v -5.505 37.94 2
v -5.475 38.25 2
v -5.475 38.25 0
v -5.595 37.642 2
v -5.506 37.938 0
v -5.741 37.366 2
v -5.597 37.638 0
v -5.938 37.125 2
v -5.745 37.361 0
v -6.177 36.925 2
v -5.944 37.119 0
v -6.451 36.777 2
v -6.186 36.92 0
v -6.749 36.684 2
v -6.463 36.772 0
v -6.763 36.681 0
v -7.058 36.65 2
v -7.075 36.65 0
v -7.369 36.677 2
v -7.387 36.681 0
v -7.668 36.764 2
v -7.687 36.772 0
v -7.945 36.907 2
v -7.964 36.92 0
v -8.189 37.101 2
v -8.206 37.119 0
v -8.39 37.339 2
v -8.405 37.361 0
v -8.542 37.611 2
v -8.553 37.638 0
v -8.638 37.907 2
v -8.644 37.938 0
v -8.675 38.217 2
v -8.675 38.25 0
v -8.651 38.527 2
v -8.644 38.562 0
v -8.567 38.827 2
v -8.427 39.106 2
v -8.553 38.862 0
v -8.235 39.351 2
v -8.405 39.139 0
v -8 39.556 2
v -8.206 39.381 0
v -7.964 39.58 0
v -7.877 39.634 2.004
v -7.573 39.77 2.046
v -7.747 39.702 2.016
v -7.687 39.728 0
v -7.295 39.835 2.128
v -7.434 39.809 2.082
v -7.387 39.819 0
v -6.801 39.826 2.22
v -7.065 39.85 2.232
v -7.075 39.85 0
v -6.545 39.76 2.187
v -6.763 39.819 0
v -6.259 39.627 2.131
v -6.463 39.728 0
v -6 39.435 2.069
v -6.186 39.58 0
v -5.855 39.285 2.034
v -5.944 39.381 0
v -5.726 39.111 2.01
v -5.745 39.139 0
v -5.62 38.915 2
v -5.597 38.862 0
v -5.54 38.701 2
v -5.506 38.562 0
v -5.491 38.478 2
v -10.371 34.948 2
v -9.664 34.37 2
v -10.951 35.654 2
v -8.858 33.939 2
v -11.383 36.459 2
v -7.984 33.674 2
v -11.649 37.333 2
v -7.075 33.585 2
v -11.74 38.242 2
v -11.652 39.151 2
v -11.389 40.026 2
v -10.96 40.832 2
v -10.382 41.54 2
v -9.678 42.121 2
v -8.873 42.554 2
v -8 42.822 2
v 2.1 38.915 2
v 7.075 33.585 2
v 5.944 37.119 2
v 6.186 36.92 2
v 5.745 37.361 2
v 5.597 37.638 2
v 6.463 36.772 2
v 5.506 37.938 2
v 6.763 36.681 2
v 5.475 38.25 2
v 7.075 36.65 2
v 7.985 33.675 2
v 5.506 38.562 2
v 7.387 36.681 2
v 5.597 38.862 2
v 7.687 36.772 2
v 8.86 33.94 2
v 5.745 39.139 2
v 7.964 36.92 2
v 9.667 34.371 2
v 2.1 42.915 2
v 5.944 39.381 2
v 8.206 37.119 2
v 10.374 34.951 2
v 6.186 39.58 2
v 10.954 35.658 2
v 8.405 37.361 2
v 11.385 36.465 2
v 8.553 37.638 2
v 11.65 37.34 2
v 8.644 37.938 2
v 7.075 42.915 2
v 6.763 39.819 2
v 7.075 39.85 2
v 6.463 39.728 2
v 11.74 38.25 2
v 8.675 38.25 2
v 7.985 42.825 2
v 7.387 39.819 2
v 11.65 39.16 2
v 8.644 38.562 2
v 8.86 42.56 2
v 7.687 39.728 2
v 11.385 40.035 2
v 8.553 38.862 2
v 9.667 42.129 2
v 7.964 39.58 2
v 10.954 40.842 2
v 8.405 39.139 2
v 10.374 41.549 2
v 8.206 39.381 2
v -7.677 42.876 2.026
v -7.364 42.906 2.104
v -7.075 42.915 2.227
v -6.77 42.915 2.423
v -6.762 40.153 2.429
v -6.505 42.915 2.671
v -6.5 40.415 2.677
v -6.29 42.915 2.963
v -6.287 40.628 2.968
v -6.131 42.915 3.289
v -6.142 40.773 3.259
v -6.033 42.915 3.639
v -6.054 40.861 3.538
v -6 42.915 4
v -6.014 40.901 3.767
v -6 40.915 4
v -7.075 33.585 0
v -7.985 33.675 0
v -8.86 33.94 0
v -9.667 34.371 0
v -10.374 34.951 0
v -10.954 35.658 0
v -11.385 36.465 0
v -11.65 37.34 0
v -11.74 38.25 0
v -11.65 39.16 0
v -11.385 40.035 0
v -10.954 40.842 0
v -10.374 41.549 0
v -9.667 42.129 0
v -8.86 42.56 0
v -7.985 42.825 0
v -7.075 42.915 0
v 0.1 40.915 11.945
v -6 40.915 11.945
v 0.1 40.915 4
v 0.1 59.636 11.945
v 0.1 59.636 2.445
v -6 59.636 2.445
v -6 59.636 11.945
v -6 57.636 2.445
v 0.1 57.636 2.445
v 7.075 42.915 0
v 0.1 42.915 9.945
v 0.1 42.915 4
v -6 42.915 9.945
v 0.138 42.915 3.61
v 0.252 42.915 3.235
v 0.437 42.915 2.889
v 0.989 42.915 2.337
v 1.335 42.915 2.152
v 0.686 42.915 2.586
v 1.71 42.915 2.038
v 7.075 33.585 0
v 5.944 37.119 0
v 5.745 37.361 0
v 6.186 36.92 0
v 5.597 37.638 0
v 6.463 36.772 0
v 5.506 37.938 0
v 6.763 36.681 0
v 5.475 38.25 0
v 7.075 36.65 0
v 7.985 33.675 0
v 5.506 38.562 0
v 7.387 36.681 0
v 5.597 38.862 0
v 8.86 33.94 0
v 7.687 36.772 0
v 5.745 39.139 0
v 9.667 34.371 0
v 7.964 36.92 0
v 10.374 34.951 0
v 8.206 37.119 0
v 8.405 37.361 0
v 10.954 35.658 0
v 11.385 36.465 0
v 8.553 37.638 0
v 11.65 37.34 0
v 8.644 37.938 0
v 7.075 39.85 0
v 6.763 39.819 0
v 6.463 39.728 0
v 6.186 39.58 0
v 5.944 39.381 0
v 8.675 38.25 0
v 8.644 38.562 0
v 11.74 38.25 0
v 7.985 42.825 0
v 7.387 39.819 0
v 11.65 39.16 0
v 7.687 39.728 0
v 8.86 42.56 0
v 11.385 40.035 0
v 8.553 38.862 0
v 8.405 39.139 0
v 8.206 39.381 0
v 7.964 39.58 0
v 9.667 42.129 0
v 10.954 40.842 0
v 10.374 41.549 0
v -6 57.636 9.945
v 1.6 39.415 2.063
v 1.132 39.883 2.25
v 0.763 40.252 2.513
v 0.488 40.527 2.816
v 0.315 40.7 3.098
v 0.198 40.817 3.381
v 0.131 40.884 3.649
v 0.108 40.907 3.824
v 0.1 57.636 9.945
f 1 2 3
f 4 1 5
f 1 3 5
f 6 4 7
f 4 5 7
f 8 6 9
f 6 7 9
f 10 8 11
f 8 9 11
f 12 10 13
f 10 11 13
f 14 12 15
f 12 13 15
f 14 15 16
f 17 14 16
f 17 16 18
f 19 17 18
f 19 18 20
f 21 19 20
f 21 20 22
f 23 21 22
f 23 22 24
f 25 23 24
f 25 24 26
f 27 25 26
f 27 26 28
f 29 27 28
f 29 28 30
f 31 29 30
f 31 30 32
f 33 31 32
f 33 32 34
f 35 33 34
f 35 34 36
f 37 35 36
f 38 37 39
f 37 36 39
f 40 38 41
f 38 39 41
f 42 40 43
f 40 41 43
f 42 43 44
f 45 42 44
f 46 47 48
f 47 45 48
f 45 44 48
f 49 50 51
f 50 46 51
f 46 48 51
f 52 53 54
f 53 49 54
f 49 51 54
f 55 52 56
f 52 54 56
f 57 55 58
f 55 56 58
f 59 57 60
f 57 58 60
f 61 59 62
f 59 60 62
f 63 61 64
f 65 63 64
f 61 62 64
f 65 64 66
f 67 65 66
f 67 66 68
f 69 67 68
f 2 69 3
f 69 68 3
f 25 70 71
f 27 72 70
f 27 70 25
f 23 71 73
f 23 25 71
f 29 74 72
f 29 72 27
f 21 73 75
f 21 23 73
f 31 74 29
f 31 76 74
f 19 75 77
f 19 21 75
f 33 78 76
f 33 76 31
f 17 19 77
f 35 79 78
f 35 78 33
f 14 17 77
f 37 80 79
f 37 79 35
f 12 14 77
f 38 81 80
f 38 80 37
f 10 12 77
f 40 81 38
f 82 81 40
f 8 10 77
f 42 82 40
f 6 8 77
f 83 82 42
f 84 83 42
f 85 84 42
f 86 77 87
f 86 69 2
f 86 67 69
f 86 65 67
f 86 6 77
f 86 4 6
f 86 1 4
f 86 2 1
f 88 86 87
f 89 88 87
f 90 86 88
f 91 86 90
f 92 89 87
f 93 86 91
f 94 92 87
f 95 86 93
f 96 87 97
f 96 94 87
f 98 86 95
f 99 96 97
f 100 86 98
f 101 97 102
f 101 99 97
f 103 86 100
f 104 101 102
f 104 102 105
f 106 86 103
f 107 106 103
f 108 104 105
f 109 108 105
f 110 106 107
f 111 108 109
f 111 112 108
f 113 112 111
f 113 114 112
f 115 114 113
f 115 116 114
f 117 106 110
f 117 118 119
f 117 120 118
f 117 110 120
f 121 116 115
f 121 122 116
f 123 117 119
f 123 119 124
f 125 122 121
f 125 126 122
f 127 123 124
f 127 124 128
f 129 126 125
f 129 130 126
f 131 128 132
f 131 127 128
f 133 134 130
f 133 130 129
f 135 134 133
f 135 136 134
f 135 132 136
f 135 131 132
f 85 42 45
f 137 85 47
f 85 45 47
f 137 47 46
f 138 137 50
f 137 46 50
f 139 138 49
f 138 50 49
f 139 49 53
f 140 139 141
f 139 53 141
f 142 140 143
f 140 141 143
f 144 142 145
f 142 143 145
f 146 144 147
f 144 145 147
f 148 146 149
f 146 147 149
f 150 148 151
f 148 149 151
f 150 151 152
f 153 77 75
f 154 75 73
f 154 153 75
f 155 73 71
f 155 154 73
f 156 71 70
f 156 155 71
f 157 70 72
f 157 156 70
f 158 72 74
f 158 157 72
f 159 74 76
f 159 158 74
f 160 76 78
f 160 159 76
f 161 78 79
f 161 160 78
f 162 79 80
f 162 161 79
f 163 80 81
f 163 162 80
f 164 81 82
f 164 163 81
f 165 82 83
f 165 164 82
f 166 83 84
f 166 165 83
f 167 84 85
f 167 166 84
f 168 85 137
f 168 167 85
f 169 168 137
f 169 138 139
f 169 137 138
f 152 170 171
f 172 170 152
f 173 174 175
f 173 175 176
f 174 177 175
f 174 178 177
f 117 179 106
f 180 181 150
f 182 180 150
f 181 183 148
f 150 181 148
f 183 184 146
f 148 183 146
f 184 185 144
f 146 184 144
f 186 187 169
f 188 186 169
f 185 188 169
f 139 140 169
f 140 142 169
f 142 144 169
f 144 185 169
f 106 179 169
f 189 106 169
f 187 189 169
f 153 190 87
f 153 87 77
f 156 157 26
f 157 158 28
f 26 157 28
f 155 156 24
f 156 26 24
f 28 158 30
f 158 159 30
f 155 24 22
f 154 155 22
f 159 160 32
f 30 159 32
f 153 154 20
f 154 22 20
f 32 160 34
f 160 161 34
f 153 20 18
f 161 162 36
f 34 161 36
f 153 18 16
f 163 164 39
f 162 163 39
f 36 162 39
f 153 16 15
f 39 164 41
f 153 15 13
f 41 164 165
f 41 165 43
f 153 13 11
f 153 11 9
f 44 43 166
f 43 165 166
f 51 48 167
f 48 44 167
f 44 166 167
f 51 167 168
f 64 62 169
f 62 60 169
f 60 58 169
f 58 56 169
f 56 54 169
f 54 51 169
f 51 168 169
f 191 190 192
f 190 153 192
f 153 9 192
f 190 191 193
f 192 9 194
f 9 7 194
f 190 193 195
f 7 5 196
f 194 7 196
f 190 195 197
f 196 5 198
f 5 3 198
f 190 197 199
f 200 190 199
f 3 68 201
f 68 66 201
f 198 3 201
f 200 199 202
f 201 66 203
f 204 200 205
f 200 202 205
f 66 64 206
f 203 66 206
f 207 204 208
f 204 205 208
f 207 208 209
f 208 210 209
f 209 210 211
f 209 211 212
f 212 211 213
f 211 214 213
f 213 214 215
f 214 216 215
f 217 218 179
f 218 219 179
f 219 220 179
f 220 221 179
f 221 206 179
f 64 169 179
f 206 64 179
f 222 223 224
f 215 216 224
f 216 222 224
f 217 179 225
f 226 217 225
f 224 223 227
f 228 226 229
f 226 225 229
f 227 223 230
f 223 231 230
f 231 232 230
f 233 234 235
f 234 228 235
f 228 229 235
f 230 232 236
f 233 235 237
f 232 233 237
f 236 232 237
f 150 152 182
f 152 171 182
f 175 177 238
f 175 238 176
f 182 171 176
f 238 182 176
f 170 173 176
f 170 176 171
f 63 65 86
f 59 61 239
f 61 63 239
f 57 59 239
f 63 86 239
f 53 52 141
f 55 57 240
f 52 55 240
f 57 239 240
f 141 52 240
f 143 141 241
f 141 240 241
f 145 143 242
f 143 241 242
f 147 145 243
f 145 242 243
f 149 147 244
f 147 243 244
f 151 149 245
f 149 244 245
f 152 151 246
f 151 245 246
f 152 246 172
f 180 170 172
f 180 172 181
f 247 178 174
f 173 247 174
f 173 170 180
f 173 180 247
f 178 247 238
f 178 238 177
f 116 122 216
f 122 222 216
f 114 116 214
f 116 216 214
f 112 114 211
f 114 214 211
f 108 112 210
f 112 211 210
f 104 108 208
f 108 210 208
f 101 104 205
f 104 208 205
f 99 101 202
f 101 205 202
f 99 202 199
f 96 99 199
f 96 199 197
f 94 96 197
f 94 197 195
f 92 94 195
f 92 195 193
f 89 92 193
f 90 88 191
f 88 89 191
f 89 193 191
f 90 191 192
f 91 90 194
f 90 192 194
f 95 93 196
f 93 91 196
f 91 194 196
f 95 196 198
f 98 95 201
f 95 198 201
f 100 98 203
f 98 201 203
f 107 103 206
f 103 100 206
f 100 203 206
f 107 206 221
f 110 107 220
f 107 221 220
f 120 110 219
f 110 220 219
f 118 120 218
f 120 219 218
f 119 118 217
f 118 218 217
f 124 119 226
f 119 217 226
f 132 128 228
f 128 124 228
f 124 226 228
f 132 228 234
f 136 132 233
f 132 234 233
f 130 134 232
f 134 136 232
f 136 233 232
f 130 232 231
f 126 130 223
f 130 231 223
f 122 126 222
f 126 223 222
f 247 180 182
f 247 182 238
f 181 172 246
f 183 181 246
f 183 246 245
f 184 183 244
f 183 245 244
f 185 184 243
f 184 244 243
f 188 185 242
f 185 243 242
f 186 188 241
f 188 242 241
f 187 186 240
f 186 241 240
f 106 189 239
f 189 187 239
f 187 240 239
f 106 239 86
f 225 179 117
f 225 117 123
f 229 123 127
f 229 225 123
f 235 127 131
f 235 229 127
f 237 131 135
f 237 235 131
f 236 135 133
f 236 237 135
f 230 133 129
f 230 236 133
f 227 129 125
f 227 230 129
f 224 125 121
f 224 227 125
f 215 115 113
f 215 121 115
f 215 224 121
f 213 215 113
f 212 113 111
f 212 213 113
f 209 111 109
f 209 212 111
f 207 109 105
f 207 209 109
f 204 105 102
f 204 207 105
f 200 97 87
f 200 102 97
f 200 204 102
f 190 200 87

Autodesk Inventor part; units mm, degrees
ref_plane "工作平面1" through (0, 0, 0) normal (0, 0, 1) x (1, 0, 0)
sketch "草圖1" plane through (0, 0, 0) normal (0, 0, 1) x (1, 0, 0)
  circle A0 centre (-7.075, 38.25) radius 2.165 projected
  circle A1 centre (7.075, 38.25) radius 2.165 projected
  arc A2 (-15.075, -26.25) -> (-13.075, -28.25) centre (-13.075, -26.25) ccw projected
  line L0 (-13.075, -28.25) -> (13.075, -28.25) projected
  arc A3 (13.075, -28.25) -> (15.075, -26.25) centre (13.075, -26.25) ccw projected
  line L1 (15.075, -26.25) -> (15.075, 43.25) construction
  line L2 (-15.075, 43.25) -> (15.075, 43.25) construction
  line L3 (-15.075, 43.25) -> (-15.075, -26.25) construction
  line L4 (-10.075, 23.25) -> (10.075, 23.25) projected
  line L5 (10.075, 23.25) -> (10.075, 3.1) projected
  line L6 (10.075, 3.1) -> (-10.075, 3.1) projected
  line L7 (-10.075, 3.1) -> (-10.075, 23.25) projected
  line L8 (-10.075, -3.1) -> (10.075, -3.1) projected
  line L9 (10.075, -3.1) -> (10.075, -23.25) projected
  line L10 (10.075, -23.25) -> (-10.075, -23.25) projected
  line L11 (-10.075, -23.25) -> (-10.075, -3.1) projected
  arc A4 (7.075, 33.585) -> (7.075, 42.915) centre (7.075, 38.25) ccw
  arc A5 (-7.075, 42.915) -> (-7.075, 33.585) centre (-7.075, 38.25) ccw
  line L12 (7.075, 33.585) -> (-7.075, 33.585)
  line L13 (7.075, 42.915) -> (-7.075, 42.915)
  circle A6 centre (7.075, 38.25) radius 1.6
  circle A7 centre (-7.075, 38.25) radius 1.6
  point P0 (0, 0)
  dimension "d0" = 2.5
  dimension "d1" = 2.5
  dimension "d20" = 3.2
  dimension "d21" = 3.2
extrude "擠出1" add sketch "草圖1" along normal blind 2 contours A0 | A1 | L12 A5 L13 A4
ref_plane "工作平面3" through (-5.8702, 48.2125, -2.9174) normal (-0.9999955, 0, 0.0030077) x (0.0030077, 0, 0.9999955)
ref_plane "工作平面4" through (0.1, 52.2125, 8.4448) normal (1, 0, 0) x (0, 1, 0)
sketch "草圖3" plane through (0.1, 52.2125, 8.4448) normal (1, 0, 0) x (0, 1, 0)
  line L0 (-18.6275, -8.4448) -> (-9.2975, -8.4448) projected
  line L1 (-9.2975, -8.4448) -> (-9.2975, -6.4448) projected
  line L2 (-18.6275, -6.4448) -> (-9.2975, -6.4448) projected
  line L3 (-18.6275, -8.4448) -> (-18.6275, -6.4448) projected
  line L4 (4, -7.96) -> (4, 0) projected
  line L5 (4, 0) -> (0, 0) projected
  line L6 (0, 0) -> (0, -9.8) projected
  line L7 (12.94, -9.8) -> (0, -9.8) projected
  line L8 (12.94, -9.8) -> (12.94, 0) projected
  line L9 (12.94, 0) -> (8.94, 0) projected
  line L10 (8.94, 0) -> (8.94, -7.96) projected
  line L11 (8.94, -7.96) -> (4, -7.96) projected
  line L12 (-9.2975, -6.4448) -> (-9.2975, 1.5)
  line L13 (-9.2975, 1.5) -> (5.4231, 1.5)
  line L14 (5.4231, 1.5) -> (5.4231, -6)
  line L15 (5.4231, -6) -> (7.4231, -6)
  line L16 (7.4231, -6) -> (7.4231, 3.5)
  line L17 (7.4231, 3.5) -> (-11.2975, 3.5)
  line L18 (-11.2975, 3.5) -> (-11.2975, -6.4448)
  point P0 (-52.2125, -8.4448)
  point P1 (-9.2975, 3.5)
  dimension "d12" = 2
  dimension "d13" = 2
  dimension "d14" = 2
  dimension "d15" = 1.5
  dimension "d16" = 7.5
extrude "擠出3" add sketch "草圖3" against normal blind 6.1 contours L2 L18 L17 L16 L15 L14 L13 L12
fillet "圓角1" radius 2 3 edges at (0.1, 41.915, 2) (-2.95, 40.915, 2) (-6, 41.915, 2)
properties part number "j3 endstop blocker_3D 列印"
